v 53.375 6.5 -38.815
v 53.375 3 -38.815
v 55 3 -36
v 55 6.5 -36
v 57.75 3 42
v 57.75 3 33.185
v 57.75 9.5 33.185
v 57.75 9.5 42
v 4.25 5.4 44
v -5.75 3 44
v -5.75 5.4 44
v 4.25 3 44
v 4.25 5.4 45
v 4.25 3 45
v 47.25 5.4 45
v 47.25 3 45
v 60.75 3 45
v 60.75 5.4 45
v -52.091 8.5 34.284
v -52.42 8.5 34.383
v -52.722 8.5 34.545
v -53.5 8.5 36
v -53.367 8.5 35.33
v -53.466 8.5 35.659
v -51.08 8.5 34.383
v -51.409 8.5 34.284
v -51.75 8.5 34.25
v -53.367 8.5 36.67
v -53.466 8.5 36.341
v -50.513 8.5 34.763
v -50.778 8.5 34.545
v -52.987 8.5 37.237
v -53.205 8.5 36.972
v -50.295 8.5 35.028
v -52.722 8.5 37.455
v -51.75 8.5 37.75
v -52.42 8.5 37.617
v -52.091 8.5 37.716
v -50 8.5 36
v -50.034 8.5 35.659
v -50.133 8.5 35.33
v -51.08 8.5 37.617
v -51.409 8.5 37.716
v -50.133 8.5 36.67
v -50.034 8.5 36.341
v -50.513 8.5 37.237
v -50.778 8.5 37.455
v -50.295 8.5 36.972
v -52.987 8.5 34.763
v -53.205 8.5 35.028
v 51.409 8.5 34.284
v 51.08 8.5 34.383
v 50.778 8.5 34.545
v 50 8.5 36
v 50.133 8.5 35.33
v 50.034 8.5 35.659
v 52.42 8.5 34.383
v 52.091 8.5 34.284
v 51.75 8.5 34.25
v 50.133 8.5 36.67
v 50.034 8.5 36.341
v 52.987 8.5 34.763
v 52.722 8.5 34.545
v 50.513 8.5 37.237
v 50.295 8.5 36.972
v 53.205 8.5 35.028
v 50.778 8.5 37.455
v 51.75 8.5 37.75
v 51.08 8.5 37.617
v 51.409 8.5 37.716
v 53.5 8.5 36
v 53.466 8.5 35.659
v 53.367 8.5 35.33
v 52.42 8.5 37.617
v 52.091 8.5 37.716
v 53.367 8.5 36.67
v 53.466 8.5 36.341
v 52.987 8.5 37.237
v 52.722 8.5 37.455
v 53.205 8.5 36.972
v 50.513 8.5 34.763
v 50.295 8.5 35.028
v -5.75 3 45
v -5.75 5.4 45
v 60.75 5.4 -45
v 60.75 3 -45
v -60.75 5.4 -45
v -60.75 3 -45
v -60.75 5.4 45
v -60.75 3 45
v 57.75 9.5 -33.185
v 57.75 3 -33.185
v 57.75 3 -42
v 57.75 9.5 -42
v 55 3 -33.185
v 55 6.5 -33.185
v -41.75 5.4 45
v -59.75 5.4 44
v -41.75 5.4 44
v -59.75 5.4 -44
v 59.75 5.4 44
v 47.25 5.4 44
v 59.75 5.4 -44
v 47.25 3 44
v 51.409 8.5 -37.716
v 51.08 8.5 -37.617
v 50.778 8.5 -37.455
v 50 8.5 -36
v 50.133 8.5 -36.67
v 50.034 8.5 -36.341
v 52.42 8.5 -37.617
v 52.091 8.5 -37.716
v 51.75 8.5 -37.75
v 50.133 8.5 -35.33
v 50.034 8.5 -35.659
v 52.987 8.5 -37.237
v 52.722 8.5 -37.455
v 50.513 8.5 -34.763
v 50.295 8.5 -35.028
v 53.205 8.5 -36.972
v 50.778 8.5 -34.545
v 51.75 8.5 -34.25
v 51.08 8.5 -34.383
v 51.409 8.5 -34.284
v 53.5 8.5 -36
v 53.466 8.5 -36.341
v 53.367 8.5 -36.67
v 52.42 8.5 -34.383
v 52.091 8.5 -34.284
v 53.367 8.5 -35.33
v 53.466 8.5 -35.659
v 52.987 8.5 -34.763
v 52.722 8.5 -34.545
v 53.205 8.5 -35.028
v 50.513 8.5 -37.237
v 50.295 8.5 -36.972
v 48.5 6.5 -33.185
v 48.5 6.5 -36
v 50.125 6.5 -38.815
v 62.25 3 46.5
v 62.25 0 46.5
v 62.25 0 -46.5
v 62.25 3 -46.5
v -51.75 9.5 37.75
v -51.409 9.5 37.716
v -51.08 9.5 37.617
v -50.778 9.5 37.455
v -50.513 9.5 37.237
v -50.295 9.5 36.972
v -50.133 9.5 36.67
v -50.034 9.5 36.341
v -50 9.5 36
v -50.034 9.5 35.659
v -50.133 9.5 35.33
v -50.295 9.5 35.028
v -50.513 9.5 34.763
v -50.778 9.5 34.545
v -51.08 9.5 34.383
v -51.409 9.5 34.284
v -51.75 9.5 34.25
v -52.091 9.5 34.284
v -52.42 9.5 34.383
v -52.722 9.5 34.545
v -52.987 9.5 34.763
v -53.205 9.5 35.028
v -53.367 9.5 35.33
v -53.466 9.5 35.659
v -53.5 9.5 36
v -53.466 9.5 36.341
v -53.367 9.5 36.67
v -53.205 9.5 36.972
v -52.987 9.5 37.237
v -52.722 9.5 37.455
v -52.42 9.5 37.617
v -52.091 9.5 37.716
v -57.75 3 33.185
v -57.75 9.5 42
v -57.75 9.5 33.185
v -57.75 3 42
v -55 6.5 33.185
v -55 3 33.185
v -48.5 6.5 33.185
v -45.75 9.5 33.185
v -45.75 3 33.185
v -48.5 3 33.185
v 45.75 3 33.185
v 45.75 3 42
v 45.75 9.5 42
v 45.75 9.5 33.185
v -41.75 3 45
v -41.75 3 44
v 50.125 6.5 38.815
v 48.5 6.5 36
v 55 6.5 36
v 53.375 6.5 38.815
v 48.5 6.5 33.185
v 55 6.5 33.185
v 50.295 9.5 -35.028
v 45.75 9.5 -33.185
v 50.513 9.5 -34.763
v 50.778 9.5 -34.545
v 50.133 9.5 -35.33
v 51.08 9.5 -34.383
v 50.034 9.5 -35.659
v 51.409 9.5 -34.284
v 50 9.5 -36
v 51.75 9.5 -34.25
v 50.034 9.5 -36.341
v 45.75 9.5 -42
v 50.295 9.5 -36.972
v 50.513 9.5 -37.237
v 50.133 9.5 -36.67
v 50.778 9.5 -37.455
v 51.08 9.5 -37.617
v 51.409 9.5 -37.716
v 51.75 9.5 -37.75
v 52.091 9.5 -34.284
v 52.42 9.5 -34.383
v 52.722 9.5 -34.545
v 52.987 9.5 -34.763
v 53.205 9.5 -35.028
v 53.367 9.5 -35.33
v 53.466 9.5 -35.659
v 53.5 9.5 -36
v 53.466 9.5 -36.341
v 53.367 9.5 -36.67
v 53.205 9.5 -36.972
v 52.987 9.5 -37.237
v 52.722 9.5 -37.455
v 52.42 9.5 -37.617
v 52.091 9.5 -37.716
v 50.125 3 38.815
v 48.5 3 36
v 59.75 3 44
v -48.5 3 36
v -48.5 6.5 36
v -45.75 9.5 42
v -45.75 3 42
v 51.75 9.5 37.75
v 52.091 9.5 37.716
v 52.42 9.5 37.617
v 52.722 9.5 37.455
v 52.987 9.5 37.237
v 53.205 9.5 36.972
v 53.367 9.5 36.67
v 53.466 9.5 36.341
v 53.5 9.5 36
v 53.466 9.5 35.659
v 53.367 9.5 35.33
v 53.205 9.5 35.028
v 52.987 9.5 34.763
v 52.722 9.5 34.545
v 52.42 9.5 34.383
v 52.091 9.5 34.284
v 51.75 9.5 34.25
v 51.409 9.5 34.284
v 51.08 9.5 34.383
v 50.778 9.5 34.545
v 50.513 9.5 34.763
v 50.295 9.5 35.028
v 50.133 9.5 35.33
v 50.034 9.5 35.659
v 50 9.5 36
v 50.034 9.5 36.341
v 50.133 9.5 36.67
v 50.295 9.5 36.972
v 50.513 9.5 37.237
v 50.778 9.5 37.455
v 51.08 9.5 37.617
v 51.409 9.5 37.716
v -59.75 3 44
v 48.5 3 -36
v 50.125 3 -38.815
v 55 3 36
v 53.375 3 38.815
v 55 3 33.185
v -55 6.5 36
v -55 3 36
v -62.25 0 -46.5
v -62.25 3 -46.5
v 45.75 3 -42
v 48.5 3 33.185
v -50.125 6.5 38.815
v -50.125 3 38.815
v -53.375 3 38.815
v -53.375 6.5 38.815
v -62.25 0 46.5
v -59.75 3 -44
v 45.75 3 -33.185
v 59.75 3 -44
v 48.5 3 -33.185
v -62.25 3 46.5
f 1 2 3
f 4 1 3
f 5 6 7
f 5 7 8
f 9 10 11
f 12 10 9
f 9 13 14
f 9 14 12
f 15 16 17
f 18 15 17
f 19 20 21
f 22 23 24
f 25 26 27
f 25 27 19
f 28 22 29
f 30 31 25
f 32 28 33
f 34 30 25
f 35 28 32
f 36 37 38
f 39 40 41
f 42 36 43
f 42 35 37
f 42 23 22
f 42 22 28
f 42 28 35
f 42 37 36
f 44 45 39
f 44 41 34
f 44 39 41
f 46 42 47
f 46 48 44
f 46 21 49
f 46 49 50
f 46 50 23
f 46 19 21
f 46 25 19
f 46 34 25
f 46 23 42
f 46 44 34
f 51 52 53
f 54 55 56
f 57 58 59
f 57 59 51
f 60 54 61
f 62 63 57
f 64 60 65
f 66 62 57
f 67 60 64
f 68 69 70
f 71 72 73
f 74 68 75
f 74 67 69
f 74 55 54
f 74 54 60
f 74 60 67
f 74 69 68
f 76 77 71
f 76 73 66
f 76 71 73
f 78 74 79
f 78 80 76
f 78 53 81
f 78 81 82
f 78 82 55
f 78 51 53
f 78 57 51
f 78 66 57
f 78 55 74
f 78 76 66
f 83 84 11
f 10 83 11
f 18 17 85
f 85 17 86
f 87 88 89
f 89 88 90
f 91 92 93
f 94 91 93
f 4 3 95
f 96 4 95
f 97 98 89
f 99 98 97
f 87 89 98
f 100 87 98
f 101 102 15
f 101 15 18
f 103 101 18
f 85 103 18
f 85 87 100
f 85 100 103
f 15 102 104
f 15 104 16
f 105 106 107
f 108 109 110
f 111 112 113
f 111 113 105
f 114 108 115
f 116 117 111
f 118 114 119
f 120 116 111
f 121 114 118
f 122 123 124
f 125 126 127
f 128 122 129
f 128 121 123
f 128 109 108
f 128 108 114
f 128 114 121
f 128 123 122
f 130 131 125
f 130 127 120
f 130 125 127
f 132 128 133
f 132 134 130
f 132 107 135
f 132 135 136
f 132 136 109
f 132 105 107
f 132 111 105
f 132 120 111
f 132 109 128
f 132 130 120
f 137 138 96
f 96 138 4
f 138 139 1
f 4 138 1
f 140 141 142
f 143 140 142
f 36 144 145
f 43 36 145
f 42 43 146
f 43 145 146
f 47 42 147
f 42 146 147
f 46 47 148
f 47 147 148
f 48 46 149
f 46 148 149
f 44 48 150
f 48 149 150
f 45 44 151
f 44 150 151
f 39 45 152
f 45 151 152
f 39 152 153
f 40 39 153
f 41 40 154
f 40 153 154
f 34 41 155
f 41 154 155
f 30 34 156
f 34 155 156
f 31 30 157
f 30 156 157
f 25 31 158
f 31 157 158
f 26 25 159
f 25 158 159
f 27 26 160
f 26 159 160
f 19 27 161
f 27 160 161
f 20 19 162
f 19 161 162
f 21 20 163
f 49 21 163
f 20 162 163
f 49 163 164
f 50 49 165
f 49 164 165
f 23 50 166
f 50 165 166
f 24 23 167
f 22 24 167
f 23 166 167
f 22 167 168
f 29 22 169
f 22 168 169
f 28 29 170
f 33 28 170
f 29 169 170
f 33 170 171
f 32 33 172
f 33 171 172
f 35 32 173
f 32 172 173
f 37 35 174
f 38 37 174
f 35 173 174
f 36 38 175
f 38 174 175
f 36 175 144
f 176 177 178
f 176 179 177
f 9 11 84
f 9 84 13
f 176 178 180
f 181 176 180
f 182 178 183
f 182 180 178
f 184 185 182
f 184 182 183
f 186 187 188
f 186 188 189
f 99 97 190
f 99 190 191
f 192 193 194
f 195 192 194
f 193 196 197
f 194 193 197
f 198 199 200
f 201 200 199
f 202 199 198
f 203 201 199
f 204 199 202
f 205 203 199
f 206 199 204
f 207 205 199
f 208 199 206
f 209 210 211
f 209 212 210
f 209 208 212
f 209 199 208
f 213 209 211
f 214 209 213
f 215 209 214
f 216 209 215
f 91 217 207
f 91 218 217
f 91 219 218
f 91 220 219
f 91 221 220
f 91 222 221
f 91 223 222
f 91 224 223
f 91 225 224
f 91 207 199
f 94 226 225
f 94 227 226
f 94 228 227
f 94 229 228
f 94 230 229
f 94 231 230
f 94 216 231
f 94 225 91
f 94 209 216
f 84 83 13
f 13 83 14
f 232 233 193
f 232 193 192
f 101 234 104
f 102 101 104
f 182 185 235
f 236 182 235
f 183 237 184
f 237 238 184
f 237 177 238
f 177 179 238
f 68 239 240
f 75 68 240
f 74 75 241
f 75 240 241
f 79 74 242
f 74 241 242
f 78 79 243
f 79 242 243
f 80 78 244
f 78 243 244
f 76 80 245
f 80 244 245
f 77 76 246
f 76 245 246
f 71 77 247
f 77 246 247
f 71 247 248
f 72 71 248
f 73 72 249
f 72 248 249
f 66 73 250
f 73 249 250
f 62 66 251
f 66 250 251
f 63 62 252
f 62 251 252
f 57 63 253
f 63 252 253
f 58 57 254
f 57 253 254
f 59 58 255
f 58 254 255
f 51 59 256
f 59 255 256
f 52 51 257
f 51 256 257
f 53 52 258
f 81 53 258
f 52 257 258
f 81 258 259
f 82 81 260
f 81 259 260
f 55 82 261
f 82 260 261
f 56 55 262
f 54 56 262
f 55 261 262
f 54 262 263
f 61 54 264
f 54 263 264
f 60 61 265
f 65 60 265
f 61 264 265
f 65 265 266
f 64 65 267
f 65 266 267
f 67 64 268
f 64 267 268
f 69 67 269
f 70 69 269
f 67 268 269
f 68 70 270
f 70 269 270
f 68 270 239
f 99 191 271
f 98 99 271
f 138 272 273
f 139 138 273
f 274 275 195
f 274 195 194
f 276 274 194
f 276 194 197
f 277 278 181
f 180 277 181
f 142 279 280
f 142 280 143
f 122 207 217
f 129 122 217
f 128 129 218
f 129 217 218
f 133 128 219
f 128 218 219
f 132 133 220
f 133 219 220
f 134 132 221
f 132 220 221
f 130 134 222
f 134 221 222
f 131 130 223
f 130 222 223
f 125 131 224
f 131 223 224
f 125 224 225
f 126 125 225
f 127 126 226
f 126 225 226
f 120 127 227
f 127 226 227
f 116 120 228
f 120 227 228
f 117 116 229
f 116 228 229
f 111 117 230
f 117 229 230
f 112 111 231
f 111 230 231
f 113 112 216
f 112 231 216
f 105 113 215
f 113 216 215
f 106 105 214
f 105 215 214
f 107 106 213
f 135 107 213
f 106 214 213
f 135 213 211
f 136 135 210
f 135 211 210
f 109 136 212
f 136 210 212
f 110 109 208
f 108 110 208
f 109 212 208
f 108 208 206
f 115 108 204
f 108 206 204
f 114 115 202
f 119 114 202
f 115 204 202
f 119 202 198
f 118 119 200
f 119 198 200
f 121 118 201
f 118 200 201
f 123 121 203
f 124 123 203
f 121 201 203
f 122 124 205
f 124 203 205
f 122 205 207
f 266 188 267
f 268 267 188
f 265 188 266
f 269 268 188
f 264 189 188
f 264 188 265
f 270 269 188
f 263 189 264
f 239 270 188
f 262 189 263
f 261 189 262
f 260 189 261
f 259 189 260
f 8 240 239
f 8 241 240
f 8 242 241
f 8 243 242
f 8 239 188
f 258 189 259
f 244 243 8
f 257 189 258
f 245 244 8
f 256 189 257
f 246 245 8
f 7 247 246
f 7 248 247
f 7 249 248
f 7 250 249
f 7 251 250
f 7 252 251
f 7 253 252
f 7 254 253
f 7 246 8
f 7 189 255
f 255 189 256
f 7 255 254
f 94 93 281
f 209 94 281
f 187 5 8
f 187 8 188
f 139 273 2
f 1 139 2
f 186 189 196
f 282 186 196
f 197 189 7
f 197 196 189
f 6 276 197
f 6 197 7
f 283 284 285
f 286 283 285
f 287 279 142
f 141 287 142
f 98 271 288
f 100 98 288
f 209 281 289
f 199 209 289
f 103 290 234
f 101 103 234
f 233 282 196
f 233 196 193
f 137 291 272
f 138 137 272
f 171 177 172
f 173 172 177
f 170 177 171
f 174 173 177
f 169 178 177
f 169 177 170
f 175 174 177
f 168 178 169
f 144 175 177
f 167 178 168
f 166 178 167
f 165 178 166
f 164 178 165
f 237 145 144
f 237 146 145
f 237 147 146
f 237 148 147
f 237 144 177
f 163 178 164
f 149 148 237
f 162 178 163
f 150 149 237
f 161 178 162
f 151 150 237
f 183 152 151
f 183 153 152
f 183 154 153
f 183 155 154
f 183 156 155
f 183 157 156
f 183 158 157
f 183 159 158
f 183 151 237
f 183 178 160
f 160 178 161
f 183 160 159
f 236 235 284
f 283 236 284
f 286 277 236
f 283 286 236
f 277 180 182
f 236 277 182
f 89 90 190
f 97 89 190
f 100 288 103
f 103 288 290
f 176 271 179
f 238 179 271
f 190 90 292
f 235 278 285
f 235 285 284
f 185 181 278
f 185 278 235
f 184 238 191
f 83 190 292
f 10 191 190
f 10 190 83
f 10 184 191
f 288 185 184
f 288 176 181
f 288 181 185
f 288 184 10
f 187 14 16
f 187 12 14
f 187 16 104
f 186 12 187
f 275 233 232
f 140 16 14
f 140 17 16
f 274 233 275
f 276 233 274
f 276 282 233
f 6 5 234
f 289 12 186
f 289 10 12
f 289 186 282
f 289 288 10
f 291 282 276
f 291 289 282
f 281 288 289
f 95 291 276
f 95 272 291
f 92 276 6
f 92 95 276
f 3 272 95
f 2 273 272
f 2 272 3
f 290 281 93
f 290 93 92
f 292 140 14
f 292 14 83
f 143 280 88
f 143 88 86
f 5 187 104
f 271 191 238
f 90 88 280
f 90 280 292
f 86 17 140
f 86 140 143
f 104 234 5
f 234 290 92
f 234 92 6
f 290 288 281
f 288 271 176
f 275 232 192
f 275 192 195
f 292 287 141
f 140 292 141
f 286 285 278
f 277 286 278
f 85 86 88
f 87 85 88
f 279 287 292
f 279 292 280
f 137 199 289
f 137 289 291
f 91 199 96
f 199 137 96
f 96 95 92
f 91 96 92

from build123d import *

# Parameters (mm, degrees)
SKETCH_1_W          = 124.5
SKETCH_1_H          = 93
EXTRUDE_1_DEPTH     = 3
SKETCH_2_W          = 10
SKETCH_2_H          = 1
EXTRUDE_1_2_DEPTH   = 2.4
EXTRUDE_2_DEPTH     = 3.5
SKETCH_4_W          = 12
SKETCH_4_H          = 8.814582562
EXTRUDE_3_DEPTH     = 3
SKETCH_5_R          = 1.75
CUT_EXTRUDE_1_DEPTH = 1


with BuildPart() as part:
    # Эскиз1 → Extrude 1 (new body)
    with BuildSketch(Plane(origin=(0, 0, 0), x_dir=(1, 0, 0), z_dir=(0, 1, 0))):
        Rectangle(SKETCH_1_W, SKETCH_1_H)
    extrude(amount=EXTRUDE_1_DEPTH)

    # Эскиз2 → Extrude 1 2 (add)
    with BuildSketch(Plane(origin=(0, 3, 0), x_dir=(1, 0, 0), z_dir=(0, 1, 0))):
        Polygon((-41.75, -44), (-59.75, -44), (-59.75, 44), (59.75, 44), (59.75, -44), (47.25, -44), (47.25, -45), (60.75, -45), (60.75, 45), (-60.75, 45), (-60.75, -45), (-41.75, -45), align=None)
        with Locations((-0.75, -44.5)):
            Rectangle(SKETCH_2_W, SKETCH_2_H)
    extrude(amount=EXTRUDE_1_2_DEPTH)

    # Эскиз3 → Бобышка-Вытянуть2 (add)
    with BuildSketch(Plane(origin=(0, 3, 0), x_dir=(1, 0, 0), z_dir=(0, 1, 0))):
        Polygon((-55, -36), (-55, -33.185417438), (-57.75, -33.185417438), (-57.75, -42), (-45.75, -42), (-45.75, -33.185417438), (-48.5, -33.185417438), (-48.5, -36), (-50.125, -38.814582562), (-53.375, -38.814582562), align=None)
        Polygon((55, 36), (55, 33.185417438), (57.75, 33.185417438), (57.75, 42), (45.75, 42), (45.75, 33.185417438), (48.5, 33.185417438), (48.5, 36), (50.125, 38.814582562), (53.375, 38.814582562), align=None)
        Polygon((55, -36), (55, -33.185417438), (57.75, -33.185417438), (57.75, -42), (45.75, -42), (45.75, -33.185417438), (48.5, -33.185417438), (48.5, -36), (50.125, -38.814582562), (53.375, -38.814582562), align=None)
    extrude(amount=EXTRUDE_2_DEPTH)

    # Эскиз4 → Бобышка-Вытянуть3 (add)
    with BuildSketch(Plane(origin=(0, 6.5, 0), x_dir=(1, 0, 0), z_dir=(0, 1, 0))):
        with Locations((-51.75, -37.592708719)):
            Rectangle(SKETCH_4_W, SKETCH_4_H)
        with Locations((51.75, -37.592708719)):
            Rectangle(SKETCH_4_W, SKETCH_4_H)
        with Locations((51.75, 37.592708719)):
            Rectangle(SKETCH_4_W, SKETCH_4_H)
    extrude(amount=EXTRUDE_3_DEPTH)

    # Эскиз5 → Вырез-Вытянуть1 (cut)
    with BuildSketch(Plane(origin=(0, 9.5, 0), x_dir=(1, 0, 0), z_dir=(0, 1, 0))):
        with Locations(Location((-51.75, -36, 0), (0, 0, 270))):
            Circle(SKETCH_5_R)
        with Locations(Location((51.75, -36, 0), (0, 0, 270))):
            Circle(SKETCH_5_R)
        with Locations(Location((51.75, 36, 0), (0, 0, 270))):
            Circle(SKETCH_5_R)
    extrude(amount=-CUT_EXTRUDE_1_DEPTH, mode=Mode.SUBTRACT)


solid = part.part
